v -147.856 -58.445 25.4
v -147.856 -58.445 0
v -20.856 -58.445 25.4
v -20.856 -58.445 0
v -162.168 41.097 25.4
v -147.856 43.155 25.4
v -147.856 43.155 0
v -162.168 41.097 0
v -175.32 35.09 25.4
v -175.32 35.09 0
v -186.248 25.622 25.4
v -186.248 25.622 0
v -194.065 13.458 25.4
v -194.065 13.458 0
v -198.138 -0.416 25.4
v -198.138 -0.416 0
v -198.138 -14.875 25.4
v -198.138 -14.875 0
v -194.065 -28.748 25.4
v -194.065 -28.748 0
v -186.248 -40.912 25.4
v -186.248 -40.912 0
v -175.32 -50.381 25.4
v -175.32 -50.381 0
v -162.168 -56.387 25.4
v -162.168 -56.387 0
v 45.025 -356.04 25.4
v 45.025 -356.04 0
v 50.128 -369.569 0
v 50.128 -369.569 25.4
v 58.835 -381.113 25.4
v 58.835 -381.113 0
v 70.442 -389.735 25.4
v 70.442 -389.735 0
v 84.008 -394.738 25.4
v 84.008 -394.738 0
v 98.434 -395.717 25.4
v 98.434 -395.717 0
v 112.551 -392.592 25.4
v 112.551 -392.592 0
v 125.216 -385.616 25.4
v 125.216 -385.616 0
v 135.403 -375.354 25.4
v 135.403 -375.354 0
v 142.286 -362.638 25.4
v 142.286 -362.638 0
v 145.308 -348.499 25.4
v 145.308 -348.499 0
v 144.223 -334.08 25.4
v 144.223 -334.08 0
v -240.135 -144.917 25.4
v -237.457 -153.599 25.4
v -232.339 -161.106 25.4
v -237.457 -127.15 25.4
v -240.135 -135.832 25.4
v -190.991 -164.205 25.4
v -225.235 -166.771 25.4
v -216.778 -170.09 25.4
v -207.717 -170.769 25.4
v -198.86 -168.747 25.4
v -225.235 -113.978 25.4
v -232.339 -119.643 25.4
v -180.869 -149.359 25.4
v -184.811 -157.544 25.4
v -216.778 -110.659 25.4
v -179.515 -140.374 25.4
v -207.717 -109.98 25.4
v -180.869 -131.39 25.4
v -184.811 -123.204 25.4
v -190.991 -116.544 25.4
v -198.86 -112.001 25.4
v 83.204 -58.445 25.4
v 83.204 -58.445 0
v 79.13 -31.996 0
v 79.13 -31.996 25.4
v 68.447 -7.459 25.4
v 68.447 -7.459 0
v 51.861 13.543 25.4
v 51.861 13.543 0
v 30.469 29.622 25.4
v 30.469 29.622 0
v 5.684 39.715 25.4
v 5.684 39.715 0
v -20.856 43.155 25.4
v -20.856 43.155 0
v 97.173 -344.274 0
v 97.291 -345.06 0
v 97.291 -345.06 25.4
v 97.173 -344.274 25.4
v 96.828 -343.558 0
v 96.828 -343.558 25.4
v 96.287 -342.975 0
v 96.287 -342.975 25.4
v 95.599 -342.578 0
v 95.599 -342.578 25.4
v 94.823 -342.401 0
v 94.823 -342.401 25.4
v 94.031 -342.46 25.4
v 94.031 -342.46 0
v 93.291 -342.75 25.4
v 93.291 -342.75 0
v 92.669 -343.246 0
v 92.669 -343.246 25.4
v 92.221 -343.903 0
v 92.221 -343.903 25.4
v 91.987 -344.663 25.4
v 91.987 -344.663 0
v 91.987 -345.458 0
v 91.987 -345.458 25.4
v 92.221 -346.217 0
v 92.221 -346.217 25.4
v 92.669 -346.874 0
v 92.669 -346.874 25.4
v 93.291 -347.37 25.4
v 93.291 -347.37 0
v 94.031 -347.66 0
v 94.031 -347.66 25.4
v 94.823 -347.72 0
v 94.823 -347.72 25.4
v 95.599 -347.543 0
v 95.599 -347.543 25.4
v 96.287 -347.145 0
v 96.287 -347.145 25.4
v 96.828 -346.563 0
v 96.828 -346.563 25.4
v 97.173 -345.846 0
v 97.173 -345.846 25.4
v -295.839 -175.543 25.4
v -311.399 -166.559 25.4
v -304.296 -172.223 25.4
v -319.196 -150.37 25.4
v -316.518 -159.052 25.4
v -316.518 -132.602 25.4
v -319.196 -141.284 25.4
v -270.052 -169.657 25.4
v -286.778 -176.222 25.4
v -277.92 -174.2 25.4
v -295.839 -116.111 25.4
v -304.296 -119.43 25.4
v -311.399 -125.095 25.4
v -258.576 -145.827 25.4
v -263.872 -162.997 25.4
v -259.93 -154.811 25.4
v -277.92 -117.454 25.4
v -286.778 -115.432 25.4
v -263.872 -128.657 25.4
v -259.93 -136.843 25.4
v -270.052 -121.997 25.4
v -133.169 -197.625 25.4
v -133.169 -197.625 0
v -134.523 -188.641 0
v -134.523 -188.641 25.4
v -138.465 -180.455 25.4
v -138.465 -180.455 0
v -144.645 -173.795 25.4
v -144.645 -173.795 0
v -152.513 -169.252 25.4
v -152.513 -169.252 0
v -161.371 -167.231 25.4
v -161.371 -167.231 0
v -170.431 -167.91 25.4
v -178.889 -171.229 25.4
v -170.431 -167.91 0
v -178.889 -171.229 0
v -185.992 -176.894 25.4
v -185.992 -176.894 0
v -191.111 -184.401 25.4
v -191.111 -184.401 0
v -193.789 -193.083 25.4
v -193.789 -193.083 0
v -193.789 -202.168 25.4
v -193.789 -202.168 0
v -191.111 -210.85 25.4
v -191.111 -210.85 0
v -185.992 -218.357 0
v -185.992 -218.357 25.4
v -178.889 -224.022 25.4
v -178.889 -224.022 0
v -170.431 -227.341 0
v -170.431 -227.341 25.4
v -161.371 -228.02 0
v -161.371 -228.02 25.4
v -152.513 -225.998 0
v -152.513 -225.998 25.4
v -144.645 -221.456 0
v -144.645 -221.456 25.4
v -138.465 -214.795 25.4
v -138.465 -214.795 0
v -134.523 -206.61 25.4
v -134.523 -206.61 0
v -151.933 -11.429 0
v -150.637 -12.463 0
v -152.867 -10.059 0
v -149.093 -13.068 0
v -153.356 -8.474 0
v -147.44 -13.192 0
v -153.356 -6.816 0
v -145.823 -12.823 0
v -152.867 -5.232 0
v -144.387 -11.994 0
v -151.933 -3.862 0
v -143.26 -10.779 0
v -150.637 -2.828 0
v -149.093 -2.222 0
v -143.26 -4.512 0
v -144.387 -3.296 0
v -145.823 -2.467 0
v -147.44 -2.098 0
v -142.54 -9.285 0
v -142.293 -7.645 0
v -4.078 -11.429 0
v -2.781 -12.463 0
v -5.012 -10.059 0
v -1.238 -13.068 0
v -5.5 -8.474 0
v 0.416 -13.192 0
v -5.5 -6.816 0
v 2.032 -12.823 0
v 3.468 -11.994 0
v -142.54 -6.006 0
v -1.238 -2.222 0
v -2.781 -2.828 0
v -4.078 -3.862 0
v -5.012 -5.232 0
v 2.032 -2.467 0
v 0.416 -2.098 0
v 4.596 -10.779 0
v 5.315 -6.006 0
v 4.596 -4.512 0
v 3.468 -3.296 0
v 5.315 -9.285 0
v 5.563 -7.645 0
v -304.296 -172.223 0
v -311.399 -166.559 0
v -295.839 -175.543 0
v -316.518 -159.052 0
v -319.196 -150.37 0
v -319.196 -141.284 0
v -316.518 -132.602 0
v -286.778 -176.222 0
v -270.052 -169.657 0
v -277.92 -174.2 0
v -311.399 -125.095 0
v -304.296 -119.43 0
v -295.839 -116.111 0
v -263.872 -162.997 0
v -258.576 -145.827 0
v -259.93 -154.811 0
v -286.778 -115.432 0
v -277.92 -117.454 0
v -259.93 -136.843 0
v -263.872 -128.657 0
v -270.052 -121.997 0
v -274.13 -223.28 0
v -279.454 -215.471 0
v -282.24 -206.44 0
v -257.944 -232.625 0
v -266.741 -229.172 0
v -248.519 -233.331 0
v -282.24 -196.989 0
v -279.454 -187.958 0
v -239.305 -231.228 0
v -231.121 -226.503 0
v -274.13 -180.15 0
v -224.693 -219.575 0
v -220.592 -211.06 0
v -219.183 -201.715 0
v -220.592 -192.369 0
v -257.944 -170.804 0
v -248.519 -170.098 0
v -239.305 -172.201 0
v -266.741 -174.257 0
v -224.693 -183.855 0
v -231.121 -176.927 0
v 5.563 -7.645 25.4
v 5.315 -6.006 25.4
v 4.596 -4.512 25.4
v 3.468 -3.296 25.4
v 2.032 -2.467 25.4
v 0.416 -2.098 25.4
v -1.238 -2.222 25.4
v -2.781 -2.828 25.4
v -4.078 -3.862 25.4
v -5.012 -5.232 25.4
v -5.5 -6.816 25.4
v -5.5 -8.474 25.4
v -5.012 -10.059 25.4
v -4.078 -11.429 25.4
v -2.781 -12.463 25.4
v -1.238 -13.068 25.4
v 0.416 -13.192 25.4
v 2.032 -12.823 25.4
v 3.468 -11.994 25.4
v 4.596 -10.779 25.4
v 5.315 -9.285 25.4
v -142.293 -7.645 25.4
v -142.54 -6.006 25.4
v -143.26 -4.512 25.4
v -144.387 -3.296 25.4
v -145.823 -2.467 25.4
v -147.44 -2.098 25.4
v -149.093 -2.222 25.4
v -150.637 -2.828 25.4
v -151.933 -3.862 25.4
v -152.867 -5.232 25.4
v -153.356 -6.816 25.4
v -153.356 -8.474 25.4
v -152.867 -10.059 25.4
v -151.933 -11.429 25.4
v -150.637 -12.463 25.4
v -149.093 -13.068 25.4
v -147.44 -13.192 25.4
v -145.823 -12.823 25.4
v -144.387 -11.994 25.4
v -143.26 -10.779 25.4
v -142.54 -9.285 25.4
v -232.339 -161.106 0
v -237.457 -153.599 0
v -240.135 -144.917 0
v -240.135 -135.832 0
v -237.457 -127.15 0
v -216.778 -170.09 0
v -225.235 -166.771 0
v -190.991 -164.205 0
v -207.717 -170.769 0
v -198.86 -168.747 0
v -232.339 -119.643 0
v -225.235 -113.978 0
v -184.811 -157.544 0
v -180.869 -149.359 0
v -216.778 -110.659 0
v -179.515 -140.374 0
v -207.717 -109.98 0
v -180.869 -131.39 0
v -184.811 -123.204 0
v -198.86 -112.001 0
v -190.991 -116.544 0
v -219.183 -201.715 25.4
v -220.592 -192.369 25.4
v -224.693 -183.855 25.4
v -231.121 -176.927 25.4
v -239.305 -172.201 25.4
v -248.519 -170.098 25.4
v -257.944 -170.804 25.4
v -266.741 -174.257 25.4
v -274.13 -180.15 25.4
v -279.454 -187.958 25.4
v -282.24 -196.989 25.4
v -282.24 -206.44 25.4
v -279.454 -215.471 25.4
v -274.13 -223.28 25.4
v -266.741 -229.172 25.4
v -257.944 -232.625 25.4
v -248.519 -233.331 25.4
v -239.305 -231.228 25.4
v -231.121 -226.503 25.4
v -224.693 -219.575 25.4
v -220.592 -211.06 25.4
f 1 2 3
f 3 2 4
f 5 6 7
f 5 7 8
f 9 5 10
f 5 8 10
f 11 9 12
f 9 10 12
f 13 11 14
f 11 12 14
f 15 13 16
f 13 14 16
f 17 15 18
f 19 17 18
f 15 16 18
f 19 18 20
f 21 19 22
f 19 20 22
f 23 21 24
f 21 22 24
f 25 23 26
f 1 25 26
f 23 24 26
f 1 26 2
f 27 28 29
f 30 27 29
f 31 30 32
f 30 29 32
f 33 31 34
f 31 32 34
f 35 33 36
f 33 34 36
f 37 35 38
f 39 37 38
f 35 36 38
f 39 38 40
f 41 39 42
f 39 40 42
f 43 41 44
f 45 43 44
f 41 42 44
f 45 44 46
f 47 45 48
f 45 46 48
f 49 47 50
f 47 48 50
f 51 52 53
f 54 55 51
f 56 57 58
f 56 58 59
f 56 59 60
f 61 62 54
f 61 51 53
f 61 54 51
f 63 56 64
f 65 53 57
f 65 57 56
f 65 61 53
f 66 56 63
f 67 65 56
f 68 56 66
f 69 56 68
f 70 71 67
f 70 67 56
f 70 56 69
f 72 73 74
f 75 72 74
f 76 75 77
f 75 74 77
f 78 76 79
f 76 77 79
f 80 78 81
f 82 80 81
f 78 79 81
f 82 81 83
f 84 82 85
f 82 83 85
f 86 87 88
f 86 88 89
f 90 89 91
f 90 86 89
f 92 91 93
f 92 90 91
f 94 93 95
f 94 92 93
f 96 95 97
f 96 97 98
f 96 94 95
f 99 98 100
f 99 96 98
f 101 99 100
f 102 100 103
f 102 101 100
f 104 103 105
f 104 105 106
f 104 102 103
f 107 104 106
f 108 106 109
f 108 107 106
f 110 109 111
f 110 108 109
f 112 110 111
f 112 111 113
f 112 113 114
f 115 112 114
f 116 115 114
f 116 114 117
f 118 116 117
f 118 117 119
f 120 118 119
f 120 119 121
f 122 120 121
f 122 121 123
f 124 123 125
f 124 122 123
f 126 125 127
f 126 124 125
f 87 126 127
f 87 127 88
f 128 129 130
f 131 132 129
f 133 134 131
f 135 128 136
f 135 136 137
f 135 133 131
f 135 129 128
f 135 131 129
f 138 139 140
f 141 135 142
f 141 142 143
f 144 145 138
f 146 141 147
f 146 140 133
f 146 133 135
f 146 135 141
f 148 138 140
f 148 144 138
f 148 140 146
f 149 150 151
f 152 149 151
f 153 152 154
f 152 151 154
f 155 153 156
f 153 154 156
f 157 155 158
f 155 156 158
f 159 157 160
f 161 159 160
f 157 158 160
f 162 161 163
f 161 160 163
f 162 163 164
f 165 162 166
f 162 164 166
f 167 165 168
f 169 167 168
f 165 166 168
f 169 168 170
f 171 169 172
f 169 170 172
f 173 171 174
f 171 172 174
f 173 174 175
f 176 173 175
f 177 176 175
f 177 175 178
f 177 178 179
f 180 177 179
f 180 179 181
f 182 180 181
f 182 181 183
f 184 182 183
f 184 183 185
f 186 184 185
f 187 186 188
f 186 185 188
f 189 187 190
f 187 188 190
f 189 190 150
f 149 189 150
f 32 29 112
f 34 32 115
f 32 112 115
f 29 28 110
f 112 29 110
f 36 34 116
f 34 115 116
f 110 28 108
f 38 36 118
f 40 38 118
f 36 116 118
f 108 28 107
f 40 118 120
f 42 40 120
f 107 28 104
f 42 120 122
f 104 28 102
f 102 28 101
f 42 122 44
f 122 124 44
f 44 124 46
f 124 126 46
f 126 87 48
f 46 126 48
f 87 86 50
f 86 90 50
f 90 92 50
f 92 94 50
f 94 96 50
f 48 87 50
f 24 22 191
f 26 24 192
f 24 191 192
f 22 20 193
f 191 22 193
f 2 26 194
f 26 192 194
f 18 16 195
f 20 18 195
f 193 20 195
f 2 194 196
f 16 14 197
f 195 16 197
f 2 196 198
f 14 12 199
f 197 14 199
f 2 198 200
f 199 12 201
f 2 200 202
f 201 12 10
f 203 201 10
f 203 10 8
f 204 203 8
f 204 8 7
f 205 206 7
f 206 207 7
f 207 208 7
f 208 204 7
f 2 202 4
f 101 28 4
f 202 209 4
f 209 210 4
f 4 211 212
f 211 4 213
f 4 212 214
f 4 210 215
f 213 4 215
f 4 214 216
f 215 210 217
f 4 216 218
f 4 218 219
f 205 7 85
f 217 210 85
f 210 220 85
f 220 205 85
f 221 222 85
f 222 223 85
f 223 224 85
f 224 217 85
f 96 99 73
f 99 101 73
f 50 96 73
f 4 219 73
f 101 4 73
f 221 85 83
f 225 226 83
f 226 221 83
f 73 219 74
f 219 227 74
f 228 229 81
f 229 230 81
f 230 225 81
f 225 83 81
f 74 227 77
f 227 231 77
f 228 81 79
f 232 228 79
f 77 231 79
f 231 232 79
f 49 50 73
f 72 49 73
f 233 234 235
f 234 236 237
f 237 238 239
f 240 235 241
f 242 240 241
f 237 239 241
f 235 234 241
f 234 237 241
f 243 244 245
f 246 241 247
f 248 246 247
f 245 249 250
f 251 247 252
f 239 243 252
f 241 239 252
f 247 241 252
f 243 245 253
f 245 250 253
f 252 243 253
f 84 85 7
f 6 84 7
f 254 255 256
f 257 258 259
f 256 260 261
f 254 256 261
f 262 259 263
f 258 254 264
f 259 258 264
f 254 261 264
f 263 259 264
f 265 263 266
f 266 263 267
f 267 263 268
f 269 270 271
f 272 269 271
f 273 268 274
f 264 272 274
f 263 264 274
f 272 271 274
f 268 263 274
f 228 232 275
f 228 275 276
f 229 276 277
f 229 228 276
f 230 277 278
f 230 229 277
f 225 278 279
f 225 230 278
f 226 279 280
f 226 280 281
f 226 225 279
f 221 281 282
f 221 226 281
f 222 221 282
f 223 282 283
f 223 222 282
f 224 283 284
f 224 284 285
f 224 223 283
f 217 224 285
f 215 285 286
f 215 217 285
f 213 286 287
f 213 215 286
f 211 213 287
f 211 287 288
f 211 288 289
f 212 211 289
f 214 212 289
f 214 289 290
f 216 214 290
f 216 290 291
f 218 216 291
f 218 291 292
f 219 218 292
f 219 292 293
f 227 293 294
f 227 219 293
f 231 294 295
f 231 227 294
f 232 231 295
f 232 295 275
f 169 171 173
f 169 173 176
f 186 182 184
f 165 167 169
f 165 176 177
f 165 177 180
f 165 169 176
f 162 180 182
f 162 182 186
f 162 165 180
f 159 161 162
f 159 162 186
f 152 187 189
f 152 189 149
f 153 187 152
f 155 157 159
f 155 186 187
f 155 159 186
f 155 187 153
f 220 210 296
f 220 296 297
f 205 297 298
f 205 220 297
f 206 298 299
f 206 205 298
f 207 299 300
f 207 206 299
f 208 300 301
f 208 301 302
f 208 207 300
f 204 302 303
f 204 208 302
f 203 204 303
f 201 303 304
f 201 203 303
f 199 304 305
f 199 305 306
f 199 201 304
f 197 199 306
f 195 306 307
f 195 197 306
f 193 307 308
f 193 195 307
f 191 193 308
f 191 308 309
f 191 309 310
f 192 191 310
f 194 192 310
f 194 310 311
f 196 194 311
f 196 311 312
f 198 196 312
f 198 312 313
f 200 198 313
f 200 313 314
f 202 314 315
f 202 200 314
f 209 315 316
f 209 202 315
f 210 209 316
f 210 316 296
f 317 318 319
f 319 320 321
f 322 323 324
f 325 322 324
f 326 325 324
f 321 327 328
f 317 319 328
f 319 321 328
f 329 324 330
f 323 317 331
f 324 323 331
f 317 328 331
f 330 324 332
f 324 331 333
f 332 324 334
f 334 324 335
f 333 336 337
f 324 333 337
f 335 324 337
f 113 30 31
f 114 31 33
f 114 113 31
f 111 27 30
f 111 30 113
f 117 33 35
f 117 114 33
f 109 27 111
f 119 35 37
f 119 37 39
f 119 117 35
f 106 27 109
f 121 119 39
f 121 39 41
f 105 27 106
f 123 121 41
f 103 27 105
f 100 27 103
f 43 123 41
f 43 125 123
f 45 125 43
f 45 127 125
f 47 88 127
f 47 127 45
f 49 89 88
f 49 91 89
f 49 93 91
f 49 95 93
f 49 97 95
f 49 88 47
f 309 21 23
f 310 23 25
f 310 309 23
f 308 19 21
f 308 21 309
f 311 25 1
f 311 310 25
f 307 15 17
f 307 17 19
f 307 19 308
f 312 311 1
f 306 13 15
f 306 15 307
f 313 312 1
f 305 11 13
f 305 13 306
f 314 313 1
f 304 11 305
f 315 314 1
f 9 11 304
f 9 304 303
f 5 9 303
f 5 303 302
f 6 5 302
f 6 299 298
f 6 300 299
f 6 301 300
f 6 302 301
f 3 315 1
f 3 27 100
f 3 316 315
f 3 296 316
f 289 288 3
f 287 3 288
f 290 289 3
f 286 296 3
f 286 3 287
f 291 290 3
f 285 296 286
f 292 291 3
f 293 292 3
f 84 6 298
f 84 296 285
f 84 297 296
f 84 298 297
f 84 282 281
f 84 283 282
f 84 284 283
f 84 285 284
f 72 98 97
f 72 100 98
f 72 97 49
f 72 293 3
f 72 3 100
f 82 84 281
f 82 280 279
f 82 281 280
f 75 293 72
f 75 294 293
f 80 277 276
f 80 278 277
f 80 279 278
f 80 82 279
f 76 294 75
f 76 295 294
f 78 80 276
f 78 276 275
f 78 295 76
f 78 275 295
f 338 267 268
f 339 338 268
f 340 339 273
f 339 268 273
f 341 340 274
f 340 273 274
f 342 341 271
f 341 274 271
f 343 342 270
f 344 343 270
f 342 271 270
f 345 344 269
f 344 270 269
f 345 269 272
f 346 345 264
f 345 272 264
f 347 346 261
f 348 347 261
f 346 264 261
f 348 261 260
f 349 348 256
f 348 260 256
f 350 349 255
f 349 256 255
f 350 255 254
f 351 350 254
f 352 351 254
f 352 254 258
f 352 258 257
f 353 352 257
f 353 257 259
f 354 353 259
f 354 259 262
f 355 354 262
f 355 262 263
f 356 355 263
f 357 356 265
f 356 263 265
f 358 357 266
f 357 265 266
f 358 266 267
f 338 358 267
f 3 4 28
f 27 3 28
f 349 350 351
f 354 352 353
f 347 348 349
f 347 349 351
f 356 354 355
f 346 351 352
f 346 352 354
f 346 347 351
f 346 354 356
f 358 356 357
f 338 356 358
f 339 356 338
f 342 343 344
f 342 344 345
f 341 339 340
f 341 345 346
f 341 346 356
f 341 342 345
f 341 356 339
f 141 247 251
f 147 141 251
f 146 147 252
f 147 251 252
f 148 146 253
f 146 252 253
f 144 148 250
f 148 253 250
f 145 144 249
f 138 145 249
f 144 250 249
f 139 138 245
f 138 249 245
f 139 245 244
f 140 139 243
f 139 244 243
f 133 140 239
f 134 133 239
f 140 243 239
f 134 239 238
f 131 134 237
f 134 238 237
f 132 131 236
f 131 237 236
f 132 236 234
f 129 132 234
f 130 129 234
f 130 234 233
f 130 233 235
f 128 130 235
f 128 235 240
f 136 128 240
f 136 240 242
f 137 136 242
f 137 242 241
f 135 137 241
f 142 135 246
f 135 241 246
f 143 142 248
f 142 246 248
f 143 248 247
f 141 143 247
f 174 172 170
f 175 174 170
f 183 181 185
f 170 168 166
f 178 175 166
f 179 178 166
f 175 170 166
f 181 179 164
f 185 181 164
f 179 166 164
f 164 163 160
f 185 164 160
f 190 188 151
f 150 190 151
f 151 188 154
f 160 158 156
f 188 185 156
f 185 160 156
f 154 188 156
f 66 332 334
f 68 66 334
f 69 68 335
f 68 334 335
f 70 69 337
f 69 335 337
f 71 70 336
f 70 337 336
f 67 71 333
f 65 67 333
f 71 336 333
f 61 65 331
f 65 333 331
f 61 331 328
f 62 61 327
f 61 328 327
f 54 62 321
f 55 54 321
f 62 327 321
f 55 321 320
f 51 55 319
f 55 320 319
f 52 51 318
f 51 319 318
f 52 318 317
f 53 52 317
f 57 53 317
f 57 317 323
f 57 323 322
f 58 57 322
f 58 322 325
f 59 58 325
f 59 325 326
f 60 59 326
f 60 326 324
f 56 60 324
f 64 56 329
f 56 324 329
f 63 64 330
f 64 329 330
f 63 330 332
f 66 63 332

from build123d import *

# Parameters (mm, degrees)
F0_R     = 30.48
F1_DEPTH = 25.4
F0_R_2   = 31.7053585068
F0_R_3   = 2.667
F0_R_4   = 5.5626


# Not quite as in the source:
# - a feature names something its author has since deleted; it is built from what else it names


with BuildPart() as f1:
    # F0 (on Top) → F1 (new body)
    with BuildSketch(Plane.XY):
        with Locations((-209.9951207638, -140.3743773699)):
            Circle(F0_R)
    extrude(amount=F1_DEPTH)


with BuildPart() as f1b:
    # F0 (on Top) → F1, piece 2 (new body)
    with BuildSketch(Plane.XY):
        with Locations((-163.6490523815, -197.625413537)):
            Circle(F0_R)
    extrude(amount=F1_DEPTH)


with BuildPart() as f1c:
    # F0 (on Top) → F1, piece 3 (new body)
    with BuildSketch(Plane.XY):
        with Locations((-250.8887052536, -201.7147690058)):
            Circle(F0_R_2)
    extrude(amount=F1_DEPTH)


with BuildPart() as f1d:
    # F0 (on Top) → F1, piece 4 (new body)
    with BuildSketch(Plane.XY):
        with Locations((-289.0560626984, -145.8268612623)):
            Circle(F0_R)
    extrude(amount=F1_DEPTH)


with BuildPart() as f1e:
    # F0 (on Top) → F1, piece 5 (new body)
    with BuildSketch(Plane.XY):
        with BuildLine():
            Line((-147.8555590361, -58.445237577), (-20.8555590361, -58.445237577))
            Line((-20.8555590361, -58.445237577), (45.0250040162, -356.040249988))
            ThreePointArc((45.0250040162, -356.040249988), (105.6042665934, -394.6593248811), (144.2233414865, -334.0800623039))
            Line((144.2233414865, -334.0800623039), (83.204249457, -58.445237577))
            ThreePointArc((83.204249457, -58.445237577), (51.8613642755, 13.5426289801), (-20.8555590361, 43.154762423))
            Line((-20.8555590361, 43.154762423), (-147.8555590361, 43.154762423))
            ThreePointArc((-147.8555590361, 43.154762423), (-198.6555590361, -7.645237577), (-147.8555590361, -58.445237577))
        make_face()
        with Locations((94.6241727513, -345.0601561459)):
            Circle(F0_R_3, mode=Mode.SUBTRACT)
        with Locations((-147.8555590361, -7.645237577)):
            Circle(F0_R_4, mode=Mode.SUBTRACT)
        with Locations((0, -7.645237577)):
            Circle(F0_R_4, mode=Mode.SUBTRACT)
    extrude(amount=F1_DEPTH)


solid = Compound([f1.part, f1b.part, f1c.part, f1d.part, f1e.part])
